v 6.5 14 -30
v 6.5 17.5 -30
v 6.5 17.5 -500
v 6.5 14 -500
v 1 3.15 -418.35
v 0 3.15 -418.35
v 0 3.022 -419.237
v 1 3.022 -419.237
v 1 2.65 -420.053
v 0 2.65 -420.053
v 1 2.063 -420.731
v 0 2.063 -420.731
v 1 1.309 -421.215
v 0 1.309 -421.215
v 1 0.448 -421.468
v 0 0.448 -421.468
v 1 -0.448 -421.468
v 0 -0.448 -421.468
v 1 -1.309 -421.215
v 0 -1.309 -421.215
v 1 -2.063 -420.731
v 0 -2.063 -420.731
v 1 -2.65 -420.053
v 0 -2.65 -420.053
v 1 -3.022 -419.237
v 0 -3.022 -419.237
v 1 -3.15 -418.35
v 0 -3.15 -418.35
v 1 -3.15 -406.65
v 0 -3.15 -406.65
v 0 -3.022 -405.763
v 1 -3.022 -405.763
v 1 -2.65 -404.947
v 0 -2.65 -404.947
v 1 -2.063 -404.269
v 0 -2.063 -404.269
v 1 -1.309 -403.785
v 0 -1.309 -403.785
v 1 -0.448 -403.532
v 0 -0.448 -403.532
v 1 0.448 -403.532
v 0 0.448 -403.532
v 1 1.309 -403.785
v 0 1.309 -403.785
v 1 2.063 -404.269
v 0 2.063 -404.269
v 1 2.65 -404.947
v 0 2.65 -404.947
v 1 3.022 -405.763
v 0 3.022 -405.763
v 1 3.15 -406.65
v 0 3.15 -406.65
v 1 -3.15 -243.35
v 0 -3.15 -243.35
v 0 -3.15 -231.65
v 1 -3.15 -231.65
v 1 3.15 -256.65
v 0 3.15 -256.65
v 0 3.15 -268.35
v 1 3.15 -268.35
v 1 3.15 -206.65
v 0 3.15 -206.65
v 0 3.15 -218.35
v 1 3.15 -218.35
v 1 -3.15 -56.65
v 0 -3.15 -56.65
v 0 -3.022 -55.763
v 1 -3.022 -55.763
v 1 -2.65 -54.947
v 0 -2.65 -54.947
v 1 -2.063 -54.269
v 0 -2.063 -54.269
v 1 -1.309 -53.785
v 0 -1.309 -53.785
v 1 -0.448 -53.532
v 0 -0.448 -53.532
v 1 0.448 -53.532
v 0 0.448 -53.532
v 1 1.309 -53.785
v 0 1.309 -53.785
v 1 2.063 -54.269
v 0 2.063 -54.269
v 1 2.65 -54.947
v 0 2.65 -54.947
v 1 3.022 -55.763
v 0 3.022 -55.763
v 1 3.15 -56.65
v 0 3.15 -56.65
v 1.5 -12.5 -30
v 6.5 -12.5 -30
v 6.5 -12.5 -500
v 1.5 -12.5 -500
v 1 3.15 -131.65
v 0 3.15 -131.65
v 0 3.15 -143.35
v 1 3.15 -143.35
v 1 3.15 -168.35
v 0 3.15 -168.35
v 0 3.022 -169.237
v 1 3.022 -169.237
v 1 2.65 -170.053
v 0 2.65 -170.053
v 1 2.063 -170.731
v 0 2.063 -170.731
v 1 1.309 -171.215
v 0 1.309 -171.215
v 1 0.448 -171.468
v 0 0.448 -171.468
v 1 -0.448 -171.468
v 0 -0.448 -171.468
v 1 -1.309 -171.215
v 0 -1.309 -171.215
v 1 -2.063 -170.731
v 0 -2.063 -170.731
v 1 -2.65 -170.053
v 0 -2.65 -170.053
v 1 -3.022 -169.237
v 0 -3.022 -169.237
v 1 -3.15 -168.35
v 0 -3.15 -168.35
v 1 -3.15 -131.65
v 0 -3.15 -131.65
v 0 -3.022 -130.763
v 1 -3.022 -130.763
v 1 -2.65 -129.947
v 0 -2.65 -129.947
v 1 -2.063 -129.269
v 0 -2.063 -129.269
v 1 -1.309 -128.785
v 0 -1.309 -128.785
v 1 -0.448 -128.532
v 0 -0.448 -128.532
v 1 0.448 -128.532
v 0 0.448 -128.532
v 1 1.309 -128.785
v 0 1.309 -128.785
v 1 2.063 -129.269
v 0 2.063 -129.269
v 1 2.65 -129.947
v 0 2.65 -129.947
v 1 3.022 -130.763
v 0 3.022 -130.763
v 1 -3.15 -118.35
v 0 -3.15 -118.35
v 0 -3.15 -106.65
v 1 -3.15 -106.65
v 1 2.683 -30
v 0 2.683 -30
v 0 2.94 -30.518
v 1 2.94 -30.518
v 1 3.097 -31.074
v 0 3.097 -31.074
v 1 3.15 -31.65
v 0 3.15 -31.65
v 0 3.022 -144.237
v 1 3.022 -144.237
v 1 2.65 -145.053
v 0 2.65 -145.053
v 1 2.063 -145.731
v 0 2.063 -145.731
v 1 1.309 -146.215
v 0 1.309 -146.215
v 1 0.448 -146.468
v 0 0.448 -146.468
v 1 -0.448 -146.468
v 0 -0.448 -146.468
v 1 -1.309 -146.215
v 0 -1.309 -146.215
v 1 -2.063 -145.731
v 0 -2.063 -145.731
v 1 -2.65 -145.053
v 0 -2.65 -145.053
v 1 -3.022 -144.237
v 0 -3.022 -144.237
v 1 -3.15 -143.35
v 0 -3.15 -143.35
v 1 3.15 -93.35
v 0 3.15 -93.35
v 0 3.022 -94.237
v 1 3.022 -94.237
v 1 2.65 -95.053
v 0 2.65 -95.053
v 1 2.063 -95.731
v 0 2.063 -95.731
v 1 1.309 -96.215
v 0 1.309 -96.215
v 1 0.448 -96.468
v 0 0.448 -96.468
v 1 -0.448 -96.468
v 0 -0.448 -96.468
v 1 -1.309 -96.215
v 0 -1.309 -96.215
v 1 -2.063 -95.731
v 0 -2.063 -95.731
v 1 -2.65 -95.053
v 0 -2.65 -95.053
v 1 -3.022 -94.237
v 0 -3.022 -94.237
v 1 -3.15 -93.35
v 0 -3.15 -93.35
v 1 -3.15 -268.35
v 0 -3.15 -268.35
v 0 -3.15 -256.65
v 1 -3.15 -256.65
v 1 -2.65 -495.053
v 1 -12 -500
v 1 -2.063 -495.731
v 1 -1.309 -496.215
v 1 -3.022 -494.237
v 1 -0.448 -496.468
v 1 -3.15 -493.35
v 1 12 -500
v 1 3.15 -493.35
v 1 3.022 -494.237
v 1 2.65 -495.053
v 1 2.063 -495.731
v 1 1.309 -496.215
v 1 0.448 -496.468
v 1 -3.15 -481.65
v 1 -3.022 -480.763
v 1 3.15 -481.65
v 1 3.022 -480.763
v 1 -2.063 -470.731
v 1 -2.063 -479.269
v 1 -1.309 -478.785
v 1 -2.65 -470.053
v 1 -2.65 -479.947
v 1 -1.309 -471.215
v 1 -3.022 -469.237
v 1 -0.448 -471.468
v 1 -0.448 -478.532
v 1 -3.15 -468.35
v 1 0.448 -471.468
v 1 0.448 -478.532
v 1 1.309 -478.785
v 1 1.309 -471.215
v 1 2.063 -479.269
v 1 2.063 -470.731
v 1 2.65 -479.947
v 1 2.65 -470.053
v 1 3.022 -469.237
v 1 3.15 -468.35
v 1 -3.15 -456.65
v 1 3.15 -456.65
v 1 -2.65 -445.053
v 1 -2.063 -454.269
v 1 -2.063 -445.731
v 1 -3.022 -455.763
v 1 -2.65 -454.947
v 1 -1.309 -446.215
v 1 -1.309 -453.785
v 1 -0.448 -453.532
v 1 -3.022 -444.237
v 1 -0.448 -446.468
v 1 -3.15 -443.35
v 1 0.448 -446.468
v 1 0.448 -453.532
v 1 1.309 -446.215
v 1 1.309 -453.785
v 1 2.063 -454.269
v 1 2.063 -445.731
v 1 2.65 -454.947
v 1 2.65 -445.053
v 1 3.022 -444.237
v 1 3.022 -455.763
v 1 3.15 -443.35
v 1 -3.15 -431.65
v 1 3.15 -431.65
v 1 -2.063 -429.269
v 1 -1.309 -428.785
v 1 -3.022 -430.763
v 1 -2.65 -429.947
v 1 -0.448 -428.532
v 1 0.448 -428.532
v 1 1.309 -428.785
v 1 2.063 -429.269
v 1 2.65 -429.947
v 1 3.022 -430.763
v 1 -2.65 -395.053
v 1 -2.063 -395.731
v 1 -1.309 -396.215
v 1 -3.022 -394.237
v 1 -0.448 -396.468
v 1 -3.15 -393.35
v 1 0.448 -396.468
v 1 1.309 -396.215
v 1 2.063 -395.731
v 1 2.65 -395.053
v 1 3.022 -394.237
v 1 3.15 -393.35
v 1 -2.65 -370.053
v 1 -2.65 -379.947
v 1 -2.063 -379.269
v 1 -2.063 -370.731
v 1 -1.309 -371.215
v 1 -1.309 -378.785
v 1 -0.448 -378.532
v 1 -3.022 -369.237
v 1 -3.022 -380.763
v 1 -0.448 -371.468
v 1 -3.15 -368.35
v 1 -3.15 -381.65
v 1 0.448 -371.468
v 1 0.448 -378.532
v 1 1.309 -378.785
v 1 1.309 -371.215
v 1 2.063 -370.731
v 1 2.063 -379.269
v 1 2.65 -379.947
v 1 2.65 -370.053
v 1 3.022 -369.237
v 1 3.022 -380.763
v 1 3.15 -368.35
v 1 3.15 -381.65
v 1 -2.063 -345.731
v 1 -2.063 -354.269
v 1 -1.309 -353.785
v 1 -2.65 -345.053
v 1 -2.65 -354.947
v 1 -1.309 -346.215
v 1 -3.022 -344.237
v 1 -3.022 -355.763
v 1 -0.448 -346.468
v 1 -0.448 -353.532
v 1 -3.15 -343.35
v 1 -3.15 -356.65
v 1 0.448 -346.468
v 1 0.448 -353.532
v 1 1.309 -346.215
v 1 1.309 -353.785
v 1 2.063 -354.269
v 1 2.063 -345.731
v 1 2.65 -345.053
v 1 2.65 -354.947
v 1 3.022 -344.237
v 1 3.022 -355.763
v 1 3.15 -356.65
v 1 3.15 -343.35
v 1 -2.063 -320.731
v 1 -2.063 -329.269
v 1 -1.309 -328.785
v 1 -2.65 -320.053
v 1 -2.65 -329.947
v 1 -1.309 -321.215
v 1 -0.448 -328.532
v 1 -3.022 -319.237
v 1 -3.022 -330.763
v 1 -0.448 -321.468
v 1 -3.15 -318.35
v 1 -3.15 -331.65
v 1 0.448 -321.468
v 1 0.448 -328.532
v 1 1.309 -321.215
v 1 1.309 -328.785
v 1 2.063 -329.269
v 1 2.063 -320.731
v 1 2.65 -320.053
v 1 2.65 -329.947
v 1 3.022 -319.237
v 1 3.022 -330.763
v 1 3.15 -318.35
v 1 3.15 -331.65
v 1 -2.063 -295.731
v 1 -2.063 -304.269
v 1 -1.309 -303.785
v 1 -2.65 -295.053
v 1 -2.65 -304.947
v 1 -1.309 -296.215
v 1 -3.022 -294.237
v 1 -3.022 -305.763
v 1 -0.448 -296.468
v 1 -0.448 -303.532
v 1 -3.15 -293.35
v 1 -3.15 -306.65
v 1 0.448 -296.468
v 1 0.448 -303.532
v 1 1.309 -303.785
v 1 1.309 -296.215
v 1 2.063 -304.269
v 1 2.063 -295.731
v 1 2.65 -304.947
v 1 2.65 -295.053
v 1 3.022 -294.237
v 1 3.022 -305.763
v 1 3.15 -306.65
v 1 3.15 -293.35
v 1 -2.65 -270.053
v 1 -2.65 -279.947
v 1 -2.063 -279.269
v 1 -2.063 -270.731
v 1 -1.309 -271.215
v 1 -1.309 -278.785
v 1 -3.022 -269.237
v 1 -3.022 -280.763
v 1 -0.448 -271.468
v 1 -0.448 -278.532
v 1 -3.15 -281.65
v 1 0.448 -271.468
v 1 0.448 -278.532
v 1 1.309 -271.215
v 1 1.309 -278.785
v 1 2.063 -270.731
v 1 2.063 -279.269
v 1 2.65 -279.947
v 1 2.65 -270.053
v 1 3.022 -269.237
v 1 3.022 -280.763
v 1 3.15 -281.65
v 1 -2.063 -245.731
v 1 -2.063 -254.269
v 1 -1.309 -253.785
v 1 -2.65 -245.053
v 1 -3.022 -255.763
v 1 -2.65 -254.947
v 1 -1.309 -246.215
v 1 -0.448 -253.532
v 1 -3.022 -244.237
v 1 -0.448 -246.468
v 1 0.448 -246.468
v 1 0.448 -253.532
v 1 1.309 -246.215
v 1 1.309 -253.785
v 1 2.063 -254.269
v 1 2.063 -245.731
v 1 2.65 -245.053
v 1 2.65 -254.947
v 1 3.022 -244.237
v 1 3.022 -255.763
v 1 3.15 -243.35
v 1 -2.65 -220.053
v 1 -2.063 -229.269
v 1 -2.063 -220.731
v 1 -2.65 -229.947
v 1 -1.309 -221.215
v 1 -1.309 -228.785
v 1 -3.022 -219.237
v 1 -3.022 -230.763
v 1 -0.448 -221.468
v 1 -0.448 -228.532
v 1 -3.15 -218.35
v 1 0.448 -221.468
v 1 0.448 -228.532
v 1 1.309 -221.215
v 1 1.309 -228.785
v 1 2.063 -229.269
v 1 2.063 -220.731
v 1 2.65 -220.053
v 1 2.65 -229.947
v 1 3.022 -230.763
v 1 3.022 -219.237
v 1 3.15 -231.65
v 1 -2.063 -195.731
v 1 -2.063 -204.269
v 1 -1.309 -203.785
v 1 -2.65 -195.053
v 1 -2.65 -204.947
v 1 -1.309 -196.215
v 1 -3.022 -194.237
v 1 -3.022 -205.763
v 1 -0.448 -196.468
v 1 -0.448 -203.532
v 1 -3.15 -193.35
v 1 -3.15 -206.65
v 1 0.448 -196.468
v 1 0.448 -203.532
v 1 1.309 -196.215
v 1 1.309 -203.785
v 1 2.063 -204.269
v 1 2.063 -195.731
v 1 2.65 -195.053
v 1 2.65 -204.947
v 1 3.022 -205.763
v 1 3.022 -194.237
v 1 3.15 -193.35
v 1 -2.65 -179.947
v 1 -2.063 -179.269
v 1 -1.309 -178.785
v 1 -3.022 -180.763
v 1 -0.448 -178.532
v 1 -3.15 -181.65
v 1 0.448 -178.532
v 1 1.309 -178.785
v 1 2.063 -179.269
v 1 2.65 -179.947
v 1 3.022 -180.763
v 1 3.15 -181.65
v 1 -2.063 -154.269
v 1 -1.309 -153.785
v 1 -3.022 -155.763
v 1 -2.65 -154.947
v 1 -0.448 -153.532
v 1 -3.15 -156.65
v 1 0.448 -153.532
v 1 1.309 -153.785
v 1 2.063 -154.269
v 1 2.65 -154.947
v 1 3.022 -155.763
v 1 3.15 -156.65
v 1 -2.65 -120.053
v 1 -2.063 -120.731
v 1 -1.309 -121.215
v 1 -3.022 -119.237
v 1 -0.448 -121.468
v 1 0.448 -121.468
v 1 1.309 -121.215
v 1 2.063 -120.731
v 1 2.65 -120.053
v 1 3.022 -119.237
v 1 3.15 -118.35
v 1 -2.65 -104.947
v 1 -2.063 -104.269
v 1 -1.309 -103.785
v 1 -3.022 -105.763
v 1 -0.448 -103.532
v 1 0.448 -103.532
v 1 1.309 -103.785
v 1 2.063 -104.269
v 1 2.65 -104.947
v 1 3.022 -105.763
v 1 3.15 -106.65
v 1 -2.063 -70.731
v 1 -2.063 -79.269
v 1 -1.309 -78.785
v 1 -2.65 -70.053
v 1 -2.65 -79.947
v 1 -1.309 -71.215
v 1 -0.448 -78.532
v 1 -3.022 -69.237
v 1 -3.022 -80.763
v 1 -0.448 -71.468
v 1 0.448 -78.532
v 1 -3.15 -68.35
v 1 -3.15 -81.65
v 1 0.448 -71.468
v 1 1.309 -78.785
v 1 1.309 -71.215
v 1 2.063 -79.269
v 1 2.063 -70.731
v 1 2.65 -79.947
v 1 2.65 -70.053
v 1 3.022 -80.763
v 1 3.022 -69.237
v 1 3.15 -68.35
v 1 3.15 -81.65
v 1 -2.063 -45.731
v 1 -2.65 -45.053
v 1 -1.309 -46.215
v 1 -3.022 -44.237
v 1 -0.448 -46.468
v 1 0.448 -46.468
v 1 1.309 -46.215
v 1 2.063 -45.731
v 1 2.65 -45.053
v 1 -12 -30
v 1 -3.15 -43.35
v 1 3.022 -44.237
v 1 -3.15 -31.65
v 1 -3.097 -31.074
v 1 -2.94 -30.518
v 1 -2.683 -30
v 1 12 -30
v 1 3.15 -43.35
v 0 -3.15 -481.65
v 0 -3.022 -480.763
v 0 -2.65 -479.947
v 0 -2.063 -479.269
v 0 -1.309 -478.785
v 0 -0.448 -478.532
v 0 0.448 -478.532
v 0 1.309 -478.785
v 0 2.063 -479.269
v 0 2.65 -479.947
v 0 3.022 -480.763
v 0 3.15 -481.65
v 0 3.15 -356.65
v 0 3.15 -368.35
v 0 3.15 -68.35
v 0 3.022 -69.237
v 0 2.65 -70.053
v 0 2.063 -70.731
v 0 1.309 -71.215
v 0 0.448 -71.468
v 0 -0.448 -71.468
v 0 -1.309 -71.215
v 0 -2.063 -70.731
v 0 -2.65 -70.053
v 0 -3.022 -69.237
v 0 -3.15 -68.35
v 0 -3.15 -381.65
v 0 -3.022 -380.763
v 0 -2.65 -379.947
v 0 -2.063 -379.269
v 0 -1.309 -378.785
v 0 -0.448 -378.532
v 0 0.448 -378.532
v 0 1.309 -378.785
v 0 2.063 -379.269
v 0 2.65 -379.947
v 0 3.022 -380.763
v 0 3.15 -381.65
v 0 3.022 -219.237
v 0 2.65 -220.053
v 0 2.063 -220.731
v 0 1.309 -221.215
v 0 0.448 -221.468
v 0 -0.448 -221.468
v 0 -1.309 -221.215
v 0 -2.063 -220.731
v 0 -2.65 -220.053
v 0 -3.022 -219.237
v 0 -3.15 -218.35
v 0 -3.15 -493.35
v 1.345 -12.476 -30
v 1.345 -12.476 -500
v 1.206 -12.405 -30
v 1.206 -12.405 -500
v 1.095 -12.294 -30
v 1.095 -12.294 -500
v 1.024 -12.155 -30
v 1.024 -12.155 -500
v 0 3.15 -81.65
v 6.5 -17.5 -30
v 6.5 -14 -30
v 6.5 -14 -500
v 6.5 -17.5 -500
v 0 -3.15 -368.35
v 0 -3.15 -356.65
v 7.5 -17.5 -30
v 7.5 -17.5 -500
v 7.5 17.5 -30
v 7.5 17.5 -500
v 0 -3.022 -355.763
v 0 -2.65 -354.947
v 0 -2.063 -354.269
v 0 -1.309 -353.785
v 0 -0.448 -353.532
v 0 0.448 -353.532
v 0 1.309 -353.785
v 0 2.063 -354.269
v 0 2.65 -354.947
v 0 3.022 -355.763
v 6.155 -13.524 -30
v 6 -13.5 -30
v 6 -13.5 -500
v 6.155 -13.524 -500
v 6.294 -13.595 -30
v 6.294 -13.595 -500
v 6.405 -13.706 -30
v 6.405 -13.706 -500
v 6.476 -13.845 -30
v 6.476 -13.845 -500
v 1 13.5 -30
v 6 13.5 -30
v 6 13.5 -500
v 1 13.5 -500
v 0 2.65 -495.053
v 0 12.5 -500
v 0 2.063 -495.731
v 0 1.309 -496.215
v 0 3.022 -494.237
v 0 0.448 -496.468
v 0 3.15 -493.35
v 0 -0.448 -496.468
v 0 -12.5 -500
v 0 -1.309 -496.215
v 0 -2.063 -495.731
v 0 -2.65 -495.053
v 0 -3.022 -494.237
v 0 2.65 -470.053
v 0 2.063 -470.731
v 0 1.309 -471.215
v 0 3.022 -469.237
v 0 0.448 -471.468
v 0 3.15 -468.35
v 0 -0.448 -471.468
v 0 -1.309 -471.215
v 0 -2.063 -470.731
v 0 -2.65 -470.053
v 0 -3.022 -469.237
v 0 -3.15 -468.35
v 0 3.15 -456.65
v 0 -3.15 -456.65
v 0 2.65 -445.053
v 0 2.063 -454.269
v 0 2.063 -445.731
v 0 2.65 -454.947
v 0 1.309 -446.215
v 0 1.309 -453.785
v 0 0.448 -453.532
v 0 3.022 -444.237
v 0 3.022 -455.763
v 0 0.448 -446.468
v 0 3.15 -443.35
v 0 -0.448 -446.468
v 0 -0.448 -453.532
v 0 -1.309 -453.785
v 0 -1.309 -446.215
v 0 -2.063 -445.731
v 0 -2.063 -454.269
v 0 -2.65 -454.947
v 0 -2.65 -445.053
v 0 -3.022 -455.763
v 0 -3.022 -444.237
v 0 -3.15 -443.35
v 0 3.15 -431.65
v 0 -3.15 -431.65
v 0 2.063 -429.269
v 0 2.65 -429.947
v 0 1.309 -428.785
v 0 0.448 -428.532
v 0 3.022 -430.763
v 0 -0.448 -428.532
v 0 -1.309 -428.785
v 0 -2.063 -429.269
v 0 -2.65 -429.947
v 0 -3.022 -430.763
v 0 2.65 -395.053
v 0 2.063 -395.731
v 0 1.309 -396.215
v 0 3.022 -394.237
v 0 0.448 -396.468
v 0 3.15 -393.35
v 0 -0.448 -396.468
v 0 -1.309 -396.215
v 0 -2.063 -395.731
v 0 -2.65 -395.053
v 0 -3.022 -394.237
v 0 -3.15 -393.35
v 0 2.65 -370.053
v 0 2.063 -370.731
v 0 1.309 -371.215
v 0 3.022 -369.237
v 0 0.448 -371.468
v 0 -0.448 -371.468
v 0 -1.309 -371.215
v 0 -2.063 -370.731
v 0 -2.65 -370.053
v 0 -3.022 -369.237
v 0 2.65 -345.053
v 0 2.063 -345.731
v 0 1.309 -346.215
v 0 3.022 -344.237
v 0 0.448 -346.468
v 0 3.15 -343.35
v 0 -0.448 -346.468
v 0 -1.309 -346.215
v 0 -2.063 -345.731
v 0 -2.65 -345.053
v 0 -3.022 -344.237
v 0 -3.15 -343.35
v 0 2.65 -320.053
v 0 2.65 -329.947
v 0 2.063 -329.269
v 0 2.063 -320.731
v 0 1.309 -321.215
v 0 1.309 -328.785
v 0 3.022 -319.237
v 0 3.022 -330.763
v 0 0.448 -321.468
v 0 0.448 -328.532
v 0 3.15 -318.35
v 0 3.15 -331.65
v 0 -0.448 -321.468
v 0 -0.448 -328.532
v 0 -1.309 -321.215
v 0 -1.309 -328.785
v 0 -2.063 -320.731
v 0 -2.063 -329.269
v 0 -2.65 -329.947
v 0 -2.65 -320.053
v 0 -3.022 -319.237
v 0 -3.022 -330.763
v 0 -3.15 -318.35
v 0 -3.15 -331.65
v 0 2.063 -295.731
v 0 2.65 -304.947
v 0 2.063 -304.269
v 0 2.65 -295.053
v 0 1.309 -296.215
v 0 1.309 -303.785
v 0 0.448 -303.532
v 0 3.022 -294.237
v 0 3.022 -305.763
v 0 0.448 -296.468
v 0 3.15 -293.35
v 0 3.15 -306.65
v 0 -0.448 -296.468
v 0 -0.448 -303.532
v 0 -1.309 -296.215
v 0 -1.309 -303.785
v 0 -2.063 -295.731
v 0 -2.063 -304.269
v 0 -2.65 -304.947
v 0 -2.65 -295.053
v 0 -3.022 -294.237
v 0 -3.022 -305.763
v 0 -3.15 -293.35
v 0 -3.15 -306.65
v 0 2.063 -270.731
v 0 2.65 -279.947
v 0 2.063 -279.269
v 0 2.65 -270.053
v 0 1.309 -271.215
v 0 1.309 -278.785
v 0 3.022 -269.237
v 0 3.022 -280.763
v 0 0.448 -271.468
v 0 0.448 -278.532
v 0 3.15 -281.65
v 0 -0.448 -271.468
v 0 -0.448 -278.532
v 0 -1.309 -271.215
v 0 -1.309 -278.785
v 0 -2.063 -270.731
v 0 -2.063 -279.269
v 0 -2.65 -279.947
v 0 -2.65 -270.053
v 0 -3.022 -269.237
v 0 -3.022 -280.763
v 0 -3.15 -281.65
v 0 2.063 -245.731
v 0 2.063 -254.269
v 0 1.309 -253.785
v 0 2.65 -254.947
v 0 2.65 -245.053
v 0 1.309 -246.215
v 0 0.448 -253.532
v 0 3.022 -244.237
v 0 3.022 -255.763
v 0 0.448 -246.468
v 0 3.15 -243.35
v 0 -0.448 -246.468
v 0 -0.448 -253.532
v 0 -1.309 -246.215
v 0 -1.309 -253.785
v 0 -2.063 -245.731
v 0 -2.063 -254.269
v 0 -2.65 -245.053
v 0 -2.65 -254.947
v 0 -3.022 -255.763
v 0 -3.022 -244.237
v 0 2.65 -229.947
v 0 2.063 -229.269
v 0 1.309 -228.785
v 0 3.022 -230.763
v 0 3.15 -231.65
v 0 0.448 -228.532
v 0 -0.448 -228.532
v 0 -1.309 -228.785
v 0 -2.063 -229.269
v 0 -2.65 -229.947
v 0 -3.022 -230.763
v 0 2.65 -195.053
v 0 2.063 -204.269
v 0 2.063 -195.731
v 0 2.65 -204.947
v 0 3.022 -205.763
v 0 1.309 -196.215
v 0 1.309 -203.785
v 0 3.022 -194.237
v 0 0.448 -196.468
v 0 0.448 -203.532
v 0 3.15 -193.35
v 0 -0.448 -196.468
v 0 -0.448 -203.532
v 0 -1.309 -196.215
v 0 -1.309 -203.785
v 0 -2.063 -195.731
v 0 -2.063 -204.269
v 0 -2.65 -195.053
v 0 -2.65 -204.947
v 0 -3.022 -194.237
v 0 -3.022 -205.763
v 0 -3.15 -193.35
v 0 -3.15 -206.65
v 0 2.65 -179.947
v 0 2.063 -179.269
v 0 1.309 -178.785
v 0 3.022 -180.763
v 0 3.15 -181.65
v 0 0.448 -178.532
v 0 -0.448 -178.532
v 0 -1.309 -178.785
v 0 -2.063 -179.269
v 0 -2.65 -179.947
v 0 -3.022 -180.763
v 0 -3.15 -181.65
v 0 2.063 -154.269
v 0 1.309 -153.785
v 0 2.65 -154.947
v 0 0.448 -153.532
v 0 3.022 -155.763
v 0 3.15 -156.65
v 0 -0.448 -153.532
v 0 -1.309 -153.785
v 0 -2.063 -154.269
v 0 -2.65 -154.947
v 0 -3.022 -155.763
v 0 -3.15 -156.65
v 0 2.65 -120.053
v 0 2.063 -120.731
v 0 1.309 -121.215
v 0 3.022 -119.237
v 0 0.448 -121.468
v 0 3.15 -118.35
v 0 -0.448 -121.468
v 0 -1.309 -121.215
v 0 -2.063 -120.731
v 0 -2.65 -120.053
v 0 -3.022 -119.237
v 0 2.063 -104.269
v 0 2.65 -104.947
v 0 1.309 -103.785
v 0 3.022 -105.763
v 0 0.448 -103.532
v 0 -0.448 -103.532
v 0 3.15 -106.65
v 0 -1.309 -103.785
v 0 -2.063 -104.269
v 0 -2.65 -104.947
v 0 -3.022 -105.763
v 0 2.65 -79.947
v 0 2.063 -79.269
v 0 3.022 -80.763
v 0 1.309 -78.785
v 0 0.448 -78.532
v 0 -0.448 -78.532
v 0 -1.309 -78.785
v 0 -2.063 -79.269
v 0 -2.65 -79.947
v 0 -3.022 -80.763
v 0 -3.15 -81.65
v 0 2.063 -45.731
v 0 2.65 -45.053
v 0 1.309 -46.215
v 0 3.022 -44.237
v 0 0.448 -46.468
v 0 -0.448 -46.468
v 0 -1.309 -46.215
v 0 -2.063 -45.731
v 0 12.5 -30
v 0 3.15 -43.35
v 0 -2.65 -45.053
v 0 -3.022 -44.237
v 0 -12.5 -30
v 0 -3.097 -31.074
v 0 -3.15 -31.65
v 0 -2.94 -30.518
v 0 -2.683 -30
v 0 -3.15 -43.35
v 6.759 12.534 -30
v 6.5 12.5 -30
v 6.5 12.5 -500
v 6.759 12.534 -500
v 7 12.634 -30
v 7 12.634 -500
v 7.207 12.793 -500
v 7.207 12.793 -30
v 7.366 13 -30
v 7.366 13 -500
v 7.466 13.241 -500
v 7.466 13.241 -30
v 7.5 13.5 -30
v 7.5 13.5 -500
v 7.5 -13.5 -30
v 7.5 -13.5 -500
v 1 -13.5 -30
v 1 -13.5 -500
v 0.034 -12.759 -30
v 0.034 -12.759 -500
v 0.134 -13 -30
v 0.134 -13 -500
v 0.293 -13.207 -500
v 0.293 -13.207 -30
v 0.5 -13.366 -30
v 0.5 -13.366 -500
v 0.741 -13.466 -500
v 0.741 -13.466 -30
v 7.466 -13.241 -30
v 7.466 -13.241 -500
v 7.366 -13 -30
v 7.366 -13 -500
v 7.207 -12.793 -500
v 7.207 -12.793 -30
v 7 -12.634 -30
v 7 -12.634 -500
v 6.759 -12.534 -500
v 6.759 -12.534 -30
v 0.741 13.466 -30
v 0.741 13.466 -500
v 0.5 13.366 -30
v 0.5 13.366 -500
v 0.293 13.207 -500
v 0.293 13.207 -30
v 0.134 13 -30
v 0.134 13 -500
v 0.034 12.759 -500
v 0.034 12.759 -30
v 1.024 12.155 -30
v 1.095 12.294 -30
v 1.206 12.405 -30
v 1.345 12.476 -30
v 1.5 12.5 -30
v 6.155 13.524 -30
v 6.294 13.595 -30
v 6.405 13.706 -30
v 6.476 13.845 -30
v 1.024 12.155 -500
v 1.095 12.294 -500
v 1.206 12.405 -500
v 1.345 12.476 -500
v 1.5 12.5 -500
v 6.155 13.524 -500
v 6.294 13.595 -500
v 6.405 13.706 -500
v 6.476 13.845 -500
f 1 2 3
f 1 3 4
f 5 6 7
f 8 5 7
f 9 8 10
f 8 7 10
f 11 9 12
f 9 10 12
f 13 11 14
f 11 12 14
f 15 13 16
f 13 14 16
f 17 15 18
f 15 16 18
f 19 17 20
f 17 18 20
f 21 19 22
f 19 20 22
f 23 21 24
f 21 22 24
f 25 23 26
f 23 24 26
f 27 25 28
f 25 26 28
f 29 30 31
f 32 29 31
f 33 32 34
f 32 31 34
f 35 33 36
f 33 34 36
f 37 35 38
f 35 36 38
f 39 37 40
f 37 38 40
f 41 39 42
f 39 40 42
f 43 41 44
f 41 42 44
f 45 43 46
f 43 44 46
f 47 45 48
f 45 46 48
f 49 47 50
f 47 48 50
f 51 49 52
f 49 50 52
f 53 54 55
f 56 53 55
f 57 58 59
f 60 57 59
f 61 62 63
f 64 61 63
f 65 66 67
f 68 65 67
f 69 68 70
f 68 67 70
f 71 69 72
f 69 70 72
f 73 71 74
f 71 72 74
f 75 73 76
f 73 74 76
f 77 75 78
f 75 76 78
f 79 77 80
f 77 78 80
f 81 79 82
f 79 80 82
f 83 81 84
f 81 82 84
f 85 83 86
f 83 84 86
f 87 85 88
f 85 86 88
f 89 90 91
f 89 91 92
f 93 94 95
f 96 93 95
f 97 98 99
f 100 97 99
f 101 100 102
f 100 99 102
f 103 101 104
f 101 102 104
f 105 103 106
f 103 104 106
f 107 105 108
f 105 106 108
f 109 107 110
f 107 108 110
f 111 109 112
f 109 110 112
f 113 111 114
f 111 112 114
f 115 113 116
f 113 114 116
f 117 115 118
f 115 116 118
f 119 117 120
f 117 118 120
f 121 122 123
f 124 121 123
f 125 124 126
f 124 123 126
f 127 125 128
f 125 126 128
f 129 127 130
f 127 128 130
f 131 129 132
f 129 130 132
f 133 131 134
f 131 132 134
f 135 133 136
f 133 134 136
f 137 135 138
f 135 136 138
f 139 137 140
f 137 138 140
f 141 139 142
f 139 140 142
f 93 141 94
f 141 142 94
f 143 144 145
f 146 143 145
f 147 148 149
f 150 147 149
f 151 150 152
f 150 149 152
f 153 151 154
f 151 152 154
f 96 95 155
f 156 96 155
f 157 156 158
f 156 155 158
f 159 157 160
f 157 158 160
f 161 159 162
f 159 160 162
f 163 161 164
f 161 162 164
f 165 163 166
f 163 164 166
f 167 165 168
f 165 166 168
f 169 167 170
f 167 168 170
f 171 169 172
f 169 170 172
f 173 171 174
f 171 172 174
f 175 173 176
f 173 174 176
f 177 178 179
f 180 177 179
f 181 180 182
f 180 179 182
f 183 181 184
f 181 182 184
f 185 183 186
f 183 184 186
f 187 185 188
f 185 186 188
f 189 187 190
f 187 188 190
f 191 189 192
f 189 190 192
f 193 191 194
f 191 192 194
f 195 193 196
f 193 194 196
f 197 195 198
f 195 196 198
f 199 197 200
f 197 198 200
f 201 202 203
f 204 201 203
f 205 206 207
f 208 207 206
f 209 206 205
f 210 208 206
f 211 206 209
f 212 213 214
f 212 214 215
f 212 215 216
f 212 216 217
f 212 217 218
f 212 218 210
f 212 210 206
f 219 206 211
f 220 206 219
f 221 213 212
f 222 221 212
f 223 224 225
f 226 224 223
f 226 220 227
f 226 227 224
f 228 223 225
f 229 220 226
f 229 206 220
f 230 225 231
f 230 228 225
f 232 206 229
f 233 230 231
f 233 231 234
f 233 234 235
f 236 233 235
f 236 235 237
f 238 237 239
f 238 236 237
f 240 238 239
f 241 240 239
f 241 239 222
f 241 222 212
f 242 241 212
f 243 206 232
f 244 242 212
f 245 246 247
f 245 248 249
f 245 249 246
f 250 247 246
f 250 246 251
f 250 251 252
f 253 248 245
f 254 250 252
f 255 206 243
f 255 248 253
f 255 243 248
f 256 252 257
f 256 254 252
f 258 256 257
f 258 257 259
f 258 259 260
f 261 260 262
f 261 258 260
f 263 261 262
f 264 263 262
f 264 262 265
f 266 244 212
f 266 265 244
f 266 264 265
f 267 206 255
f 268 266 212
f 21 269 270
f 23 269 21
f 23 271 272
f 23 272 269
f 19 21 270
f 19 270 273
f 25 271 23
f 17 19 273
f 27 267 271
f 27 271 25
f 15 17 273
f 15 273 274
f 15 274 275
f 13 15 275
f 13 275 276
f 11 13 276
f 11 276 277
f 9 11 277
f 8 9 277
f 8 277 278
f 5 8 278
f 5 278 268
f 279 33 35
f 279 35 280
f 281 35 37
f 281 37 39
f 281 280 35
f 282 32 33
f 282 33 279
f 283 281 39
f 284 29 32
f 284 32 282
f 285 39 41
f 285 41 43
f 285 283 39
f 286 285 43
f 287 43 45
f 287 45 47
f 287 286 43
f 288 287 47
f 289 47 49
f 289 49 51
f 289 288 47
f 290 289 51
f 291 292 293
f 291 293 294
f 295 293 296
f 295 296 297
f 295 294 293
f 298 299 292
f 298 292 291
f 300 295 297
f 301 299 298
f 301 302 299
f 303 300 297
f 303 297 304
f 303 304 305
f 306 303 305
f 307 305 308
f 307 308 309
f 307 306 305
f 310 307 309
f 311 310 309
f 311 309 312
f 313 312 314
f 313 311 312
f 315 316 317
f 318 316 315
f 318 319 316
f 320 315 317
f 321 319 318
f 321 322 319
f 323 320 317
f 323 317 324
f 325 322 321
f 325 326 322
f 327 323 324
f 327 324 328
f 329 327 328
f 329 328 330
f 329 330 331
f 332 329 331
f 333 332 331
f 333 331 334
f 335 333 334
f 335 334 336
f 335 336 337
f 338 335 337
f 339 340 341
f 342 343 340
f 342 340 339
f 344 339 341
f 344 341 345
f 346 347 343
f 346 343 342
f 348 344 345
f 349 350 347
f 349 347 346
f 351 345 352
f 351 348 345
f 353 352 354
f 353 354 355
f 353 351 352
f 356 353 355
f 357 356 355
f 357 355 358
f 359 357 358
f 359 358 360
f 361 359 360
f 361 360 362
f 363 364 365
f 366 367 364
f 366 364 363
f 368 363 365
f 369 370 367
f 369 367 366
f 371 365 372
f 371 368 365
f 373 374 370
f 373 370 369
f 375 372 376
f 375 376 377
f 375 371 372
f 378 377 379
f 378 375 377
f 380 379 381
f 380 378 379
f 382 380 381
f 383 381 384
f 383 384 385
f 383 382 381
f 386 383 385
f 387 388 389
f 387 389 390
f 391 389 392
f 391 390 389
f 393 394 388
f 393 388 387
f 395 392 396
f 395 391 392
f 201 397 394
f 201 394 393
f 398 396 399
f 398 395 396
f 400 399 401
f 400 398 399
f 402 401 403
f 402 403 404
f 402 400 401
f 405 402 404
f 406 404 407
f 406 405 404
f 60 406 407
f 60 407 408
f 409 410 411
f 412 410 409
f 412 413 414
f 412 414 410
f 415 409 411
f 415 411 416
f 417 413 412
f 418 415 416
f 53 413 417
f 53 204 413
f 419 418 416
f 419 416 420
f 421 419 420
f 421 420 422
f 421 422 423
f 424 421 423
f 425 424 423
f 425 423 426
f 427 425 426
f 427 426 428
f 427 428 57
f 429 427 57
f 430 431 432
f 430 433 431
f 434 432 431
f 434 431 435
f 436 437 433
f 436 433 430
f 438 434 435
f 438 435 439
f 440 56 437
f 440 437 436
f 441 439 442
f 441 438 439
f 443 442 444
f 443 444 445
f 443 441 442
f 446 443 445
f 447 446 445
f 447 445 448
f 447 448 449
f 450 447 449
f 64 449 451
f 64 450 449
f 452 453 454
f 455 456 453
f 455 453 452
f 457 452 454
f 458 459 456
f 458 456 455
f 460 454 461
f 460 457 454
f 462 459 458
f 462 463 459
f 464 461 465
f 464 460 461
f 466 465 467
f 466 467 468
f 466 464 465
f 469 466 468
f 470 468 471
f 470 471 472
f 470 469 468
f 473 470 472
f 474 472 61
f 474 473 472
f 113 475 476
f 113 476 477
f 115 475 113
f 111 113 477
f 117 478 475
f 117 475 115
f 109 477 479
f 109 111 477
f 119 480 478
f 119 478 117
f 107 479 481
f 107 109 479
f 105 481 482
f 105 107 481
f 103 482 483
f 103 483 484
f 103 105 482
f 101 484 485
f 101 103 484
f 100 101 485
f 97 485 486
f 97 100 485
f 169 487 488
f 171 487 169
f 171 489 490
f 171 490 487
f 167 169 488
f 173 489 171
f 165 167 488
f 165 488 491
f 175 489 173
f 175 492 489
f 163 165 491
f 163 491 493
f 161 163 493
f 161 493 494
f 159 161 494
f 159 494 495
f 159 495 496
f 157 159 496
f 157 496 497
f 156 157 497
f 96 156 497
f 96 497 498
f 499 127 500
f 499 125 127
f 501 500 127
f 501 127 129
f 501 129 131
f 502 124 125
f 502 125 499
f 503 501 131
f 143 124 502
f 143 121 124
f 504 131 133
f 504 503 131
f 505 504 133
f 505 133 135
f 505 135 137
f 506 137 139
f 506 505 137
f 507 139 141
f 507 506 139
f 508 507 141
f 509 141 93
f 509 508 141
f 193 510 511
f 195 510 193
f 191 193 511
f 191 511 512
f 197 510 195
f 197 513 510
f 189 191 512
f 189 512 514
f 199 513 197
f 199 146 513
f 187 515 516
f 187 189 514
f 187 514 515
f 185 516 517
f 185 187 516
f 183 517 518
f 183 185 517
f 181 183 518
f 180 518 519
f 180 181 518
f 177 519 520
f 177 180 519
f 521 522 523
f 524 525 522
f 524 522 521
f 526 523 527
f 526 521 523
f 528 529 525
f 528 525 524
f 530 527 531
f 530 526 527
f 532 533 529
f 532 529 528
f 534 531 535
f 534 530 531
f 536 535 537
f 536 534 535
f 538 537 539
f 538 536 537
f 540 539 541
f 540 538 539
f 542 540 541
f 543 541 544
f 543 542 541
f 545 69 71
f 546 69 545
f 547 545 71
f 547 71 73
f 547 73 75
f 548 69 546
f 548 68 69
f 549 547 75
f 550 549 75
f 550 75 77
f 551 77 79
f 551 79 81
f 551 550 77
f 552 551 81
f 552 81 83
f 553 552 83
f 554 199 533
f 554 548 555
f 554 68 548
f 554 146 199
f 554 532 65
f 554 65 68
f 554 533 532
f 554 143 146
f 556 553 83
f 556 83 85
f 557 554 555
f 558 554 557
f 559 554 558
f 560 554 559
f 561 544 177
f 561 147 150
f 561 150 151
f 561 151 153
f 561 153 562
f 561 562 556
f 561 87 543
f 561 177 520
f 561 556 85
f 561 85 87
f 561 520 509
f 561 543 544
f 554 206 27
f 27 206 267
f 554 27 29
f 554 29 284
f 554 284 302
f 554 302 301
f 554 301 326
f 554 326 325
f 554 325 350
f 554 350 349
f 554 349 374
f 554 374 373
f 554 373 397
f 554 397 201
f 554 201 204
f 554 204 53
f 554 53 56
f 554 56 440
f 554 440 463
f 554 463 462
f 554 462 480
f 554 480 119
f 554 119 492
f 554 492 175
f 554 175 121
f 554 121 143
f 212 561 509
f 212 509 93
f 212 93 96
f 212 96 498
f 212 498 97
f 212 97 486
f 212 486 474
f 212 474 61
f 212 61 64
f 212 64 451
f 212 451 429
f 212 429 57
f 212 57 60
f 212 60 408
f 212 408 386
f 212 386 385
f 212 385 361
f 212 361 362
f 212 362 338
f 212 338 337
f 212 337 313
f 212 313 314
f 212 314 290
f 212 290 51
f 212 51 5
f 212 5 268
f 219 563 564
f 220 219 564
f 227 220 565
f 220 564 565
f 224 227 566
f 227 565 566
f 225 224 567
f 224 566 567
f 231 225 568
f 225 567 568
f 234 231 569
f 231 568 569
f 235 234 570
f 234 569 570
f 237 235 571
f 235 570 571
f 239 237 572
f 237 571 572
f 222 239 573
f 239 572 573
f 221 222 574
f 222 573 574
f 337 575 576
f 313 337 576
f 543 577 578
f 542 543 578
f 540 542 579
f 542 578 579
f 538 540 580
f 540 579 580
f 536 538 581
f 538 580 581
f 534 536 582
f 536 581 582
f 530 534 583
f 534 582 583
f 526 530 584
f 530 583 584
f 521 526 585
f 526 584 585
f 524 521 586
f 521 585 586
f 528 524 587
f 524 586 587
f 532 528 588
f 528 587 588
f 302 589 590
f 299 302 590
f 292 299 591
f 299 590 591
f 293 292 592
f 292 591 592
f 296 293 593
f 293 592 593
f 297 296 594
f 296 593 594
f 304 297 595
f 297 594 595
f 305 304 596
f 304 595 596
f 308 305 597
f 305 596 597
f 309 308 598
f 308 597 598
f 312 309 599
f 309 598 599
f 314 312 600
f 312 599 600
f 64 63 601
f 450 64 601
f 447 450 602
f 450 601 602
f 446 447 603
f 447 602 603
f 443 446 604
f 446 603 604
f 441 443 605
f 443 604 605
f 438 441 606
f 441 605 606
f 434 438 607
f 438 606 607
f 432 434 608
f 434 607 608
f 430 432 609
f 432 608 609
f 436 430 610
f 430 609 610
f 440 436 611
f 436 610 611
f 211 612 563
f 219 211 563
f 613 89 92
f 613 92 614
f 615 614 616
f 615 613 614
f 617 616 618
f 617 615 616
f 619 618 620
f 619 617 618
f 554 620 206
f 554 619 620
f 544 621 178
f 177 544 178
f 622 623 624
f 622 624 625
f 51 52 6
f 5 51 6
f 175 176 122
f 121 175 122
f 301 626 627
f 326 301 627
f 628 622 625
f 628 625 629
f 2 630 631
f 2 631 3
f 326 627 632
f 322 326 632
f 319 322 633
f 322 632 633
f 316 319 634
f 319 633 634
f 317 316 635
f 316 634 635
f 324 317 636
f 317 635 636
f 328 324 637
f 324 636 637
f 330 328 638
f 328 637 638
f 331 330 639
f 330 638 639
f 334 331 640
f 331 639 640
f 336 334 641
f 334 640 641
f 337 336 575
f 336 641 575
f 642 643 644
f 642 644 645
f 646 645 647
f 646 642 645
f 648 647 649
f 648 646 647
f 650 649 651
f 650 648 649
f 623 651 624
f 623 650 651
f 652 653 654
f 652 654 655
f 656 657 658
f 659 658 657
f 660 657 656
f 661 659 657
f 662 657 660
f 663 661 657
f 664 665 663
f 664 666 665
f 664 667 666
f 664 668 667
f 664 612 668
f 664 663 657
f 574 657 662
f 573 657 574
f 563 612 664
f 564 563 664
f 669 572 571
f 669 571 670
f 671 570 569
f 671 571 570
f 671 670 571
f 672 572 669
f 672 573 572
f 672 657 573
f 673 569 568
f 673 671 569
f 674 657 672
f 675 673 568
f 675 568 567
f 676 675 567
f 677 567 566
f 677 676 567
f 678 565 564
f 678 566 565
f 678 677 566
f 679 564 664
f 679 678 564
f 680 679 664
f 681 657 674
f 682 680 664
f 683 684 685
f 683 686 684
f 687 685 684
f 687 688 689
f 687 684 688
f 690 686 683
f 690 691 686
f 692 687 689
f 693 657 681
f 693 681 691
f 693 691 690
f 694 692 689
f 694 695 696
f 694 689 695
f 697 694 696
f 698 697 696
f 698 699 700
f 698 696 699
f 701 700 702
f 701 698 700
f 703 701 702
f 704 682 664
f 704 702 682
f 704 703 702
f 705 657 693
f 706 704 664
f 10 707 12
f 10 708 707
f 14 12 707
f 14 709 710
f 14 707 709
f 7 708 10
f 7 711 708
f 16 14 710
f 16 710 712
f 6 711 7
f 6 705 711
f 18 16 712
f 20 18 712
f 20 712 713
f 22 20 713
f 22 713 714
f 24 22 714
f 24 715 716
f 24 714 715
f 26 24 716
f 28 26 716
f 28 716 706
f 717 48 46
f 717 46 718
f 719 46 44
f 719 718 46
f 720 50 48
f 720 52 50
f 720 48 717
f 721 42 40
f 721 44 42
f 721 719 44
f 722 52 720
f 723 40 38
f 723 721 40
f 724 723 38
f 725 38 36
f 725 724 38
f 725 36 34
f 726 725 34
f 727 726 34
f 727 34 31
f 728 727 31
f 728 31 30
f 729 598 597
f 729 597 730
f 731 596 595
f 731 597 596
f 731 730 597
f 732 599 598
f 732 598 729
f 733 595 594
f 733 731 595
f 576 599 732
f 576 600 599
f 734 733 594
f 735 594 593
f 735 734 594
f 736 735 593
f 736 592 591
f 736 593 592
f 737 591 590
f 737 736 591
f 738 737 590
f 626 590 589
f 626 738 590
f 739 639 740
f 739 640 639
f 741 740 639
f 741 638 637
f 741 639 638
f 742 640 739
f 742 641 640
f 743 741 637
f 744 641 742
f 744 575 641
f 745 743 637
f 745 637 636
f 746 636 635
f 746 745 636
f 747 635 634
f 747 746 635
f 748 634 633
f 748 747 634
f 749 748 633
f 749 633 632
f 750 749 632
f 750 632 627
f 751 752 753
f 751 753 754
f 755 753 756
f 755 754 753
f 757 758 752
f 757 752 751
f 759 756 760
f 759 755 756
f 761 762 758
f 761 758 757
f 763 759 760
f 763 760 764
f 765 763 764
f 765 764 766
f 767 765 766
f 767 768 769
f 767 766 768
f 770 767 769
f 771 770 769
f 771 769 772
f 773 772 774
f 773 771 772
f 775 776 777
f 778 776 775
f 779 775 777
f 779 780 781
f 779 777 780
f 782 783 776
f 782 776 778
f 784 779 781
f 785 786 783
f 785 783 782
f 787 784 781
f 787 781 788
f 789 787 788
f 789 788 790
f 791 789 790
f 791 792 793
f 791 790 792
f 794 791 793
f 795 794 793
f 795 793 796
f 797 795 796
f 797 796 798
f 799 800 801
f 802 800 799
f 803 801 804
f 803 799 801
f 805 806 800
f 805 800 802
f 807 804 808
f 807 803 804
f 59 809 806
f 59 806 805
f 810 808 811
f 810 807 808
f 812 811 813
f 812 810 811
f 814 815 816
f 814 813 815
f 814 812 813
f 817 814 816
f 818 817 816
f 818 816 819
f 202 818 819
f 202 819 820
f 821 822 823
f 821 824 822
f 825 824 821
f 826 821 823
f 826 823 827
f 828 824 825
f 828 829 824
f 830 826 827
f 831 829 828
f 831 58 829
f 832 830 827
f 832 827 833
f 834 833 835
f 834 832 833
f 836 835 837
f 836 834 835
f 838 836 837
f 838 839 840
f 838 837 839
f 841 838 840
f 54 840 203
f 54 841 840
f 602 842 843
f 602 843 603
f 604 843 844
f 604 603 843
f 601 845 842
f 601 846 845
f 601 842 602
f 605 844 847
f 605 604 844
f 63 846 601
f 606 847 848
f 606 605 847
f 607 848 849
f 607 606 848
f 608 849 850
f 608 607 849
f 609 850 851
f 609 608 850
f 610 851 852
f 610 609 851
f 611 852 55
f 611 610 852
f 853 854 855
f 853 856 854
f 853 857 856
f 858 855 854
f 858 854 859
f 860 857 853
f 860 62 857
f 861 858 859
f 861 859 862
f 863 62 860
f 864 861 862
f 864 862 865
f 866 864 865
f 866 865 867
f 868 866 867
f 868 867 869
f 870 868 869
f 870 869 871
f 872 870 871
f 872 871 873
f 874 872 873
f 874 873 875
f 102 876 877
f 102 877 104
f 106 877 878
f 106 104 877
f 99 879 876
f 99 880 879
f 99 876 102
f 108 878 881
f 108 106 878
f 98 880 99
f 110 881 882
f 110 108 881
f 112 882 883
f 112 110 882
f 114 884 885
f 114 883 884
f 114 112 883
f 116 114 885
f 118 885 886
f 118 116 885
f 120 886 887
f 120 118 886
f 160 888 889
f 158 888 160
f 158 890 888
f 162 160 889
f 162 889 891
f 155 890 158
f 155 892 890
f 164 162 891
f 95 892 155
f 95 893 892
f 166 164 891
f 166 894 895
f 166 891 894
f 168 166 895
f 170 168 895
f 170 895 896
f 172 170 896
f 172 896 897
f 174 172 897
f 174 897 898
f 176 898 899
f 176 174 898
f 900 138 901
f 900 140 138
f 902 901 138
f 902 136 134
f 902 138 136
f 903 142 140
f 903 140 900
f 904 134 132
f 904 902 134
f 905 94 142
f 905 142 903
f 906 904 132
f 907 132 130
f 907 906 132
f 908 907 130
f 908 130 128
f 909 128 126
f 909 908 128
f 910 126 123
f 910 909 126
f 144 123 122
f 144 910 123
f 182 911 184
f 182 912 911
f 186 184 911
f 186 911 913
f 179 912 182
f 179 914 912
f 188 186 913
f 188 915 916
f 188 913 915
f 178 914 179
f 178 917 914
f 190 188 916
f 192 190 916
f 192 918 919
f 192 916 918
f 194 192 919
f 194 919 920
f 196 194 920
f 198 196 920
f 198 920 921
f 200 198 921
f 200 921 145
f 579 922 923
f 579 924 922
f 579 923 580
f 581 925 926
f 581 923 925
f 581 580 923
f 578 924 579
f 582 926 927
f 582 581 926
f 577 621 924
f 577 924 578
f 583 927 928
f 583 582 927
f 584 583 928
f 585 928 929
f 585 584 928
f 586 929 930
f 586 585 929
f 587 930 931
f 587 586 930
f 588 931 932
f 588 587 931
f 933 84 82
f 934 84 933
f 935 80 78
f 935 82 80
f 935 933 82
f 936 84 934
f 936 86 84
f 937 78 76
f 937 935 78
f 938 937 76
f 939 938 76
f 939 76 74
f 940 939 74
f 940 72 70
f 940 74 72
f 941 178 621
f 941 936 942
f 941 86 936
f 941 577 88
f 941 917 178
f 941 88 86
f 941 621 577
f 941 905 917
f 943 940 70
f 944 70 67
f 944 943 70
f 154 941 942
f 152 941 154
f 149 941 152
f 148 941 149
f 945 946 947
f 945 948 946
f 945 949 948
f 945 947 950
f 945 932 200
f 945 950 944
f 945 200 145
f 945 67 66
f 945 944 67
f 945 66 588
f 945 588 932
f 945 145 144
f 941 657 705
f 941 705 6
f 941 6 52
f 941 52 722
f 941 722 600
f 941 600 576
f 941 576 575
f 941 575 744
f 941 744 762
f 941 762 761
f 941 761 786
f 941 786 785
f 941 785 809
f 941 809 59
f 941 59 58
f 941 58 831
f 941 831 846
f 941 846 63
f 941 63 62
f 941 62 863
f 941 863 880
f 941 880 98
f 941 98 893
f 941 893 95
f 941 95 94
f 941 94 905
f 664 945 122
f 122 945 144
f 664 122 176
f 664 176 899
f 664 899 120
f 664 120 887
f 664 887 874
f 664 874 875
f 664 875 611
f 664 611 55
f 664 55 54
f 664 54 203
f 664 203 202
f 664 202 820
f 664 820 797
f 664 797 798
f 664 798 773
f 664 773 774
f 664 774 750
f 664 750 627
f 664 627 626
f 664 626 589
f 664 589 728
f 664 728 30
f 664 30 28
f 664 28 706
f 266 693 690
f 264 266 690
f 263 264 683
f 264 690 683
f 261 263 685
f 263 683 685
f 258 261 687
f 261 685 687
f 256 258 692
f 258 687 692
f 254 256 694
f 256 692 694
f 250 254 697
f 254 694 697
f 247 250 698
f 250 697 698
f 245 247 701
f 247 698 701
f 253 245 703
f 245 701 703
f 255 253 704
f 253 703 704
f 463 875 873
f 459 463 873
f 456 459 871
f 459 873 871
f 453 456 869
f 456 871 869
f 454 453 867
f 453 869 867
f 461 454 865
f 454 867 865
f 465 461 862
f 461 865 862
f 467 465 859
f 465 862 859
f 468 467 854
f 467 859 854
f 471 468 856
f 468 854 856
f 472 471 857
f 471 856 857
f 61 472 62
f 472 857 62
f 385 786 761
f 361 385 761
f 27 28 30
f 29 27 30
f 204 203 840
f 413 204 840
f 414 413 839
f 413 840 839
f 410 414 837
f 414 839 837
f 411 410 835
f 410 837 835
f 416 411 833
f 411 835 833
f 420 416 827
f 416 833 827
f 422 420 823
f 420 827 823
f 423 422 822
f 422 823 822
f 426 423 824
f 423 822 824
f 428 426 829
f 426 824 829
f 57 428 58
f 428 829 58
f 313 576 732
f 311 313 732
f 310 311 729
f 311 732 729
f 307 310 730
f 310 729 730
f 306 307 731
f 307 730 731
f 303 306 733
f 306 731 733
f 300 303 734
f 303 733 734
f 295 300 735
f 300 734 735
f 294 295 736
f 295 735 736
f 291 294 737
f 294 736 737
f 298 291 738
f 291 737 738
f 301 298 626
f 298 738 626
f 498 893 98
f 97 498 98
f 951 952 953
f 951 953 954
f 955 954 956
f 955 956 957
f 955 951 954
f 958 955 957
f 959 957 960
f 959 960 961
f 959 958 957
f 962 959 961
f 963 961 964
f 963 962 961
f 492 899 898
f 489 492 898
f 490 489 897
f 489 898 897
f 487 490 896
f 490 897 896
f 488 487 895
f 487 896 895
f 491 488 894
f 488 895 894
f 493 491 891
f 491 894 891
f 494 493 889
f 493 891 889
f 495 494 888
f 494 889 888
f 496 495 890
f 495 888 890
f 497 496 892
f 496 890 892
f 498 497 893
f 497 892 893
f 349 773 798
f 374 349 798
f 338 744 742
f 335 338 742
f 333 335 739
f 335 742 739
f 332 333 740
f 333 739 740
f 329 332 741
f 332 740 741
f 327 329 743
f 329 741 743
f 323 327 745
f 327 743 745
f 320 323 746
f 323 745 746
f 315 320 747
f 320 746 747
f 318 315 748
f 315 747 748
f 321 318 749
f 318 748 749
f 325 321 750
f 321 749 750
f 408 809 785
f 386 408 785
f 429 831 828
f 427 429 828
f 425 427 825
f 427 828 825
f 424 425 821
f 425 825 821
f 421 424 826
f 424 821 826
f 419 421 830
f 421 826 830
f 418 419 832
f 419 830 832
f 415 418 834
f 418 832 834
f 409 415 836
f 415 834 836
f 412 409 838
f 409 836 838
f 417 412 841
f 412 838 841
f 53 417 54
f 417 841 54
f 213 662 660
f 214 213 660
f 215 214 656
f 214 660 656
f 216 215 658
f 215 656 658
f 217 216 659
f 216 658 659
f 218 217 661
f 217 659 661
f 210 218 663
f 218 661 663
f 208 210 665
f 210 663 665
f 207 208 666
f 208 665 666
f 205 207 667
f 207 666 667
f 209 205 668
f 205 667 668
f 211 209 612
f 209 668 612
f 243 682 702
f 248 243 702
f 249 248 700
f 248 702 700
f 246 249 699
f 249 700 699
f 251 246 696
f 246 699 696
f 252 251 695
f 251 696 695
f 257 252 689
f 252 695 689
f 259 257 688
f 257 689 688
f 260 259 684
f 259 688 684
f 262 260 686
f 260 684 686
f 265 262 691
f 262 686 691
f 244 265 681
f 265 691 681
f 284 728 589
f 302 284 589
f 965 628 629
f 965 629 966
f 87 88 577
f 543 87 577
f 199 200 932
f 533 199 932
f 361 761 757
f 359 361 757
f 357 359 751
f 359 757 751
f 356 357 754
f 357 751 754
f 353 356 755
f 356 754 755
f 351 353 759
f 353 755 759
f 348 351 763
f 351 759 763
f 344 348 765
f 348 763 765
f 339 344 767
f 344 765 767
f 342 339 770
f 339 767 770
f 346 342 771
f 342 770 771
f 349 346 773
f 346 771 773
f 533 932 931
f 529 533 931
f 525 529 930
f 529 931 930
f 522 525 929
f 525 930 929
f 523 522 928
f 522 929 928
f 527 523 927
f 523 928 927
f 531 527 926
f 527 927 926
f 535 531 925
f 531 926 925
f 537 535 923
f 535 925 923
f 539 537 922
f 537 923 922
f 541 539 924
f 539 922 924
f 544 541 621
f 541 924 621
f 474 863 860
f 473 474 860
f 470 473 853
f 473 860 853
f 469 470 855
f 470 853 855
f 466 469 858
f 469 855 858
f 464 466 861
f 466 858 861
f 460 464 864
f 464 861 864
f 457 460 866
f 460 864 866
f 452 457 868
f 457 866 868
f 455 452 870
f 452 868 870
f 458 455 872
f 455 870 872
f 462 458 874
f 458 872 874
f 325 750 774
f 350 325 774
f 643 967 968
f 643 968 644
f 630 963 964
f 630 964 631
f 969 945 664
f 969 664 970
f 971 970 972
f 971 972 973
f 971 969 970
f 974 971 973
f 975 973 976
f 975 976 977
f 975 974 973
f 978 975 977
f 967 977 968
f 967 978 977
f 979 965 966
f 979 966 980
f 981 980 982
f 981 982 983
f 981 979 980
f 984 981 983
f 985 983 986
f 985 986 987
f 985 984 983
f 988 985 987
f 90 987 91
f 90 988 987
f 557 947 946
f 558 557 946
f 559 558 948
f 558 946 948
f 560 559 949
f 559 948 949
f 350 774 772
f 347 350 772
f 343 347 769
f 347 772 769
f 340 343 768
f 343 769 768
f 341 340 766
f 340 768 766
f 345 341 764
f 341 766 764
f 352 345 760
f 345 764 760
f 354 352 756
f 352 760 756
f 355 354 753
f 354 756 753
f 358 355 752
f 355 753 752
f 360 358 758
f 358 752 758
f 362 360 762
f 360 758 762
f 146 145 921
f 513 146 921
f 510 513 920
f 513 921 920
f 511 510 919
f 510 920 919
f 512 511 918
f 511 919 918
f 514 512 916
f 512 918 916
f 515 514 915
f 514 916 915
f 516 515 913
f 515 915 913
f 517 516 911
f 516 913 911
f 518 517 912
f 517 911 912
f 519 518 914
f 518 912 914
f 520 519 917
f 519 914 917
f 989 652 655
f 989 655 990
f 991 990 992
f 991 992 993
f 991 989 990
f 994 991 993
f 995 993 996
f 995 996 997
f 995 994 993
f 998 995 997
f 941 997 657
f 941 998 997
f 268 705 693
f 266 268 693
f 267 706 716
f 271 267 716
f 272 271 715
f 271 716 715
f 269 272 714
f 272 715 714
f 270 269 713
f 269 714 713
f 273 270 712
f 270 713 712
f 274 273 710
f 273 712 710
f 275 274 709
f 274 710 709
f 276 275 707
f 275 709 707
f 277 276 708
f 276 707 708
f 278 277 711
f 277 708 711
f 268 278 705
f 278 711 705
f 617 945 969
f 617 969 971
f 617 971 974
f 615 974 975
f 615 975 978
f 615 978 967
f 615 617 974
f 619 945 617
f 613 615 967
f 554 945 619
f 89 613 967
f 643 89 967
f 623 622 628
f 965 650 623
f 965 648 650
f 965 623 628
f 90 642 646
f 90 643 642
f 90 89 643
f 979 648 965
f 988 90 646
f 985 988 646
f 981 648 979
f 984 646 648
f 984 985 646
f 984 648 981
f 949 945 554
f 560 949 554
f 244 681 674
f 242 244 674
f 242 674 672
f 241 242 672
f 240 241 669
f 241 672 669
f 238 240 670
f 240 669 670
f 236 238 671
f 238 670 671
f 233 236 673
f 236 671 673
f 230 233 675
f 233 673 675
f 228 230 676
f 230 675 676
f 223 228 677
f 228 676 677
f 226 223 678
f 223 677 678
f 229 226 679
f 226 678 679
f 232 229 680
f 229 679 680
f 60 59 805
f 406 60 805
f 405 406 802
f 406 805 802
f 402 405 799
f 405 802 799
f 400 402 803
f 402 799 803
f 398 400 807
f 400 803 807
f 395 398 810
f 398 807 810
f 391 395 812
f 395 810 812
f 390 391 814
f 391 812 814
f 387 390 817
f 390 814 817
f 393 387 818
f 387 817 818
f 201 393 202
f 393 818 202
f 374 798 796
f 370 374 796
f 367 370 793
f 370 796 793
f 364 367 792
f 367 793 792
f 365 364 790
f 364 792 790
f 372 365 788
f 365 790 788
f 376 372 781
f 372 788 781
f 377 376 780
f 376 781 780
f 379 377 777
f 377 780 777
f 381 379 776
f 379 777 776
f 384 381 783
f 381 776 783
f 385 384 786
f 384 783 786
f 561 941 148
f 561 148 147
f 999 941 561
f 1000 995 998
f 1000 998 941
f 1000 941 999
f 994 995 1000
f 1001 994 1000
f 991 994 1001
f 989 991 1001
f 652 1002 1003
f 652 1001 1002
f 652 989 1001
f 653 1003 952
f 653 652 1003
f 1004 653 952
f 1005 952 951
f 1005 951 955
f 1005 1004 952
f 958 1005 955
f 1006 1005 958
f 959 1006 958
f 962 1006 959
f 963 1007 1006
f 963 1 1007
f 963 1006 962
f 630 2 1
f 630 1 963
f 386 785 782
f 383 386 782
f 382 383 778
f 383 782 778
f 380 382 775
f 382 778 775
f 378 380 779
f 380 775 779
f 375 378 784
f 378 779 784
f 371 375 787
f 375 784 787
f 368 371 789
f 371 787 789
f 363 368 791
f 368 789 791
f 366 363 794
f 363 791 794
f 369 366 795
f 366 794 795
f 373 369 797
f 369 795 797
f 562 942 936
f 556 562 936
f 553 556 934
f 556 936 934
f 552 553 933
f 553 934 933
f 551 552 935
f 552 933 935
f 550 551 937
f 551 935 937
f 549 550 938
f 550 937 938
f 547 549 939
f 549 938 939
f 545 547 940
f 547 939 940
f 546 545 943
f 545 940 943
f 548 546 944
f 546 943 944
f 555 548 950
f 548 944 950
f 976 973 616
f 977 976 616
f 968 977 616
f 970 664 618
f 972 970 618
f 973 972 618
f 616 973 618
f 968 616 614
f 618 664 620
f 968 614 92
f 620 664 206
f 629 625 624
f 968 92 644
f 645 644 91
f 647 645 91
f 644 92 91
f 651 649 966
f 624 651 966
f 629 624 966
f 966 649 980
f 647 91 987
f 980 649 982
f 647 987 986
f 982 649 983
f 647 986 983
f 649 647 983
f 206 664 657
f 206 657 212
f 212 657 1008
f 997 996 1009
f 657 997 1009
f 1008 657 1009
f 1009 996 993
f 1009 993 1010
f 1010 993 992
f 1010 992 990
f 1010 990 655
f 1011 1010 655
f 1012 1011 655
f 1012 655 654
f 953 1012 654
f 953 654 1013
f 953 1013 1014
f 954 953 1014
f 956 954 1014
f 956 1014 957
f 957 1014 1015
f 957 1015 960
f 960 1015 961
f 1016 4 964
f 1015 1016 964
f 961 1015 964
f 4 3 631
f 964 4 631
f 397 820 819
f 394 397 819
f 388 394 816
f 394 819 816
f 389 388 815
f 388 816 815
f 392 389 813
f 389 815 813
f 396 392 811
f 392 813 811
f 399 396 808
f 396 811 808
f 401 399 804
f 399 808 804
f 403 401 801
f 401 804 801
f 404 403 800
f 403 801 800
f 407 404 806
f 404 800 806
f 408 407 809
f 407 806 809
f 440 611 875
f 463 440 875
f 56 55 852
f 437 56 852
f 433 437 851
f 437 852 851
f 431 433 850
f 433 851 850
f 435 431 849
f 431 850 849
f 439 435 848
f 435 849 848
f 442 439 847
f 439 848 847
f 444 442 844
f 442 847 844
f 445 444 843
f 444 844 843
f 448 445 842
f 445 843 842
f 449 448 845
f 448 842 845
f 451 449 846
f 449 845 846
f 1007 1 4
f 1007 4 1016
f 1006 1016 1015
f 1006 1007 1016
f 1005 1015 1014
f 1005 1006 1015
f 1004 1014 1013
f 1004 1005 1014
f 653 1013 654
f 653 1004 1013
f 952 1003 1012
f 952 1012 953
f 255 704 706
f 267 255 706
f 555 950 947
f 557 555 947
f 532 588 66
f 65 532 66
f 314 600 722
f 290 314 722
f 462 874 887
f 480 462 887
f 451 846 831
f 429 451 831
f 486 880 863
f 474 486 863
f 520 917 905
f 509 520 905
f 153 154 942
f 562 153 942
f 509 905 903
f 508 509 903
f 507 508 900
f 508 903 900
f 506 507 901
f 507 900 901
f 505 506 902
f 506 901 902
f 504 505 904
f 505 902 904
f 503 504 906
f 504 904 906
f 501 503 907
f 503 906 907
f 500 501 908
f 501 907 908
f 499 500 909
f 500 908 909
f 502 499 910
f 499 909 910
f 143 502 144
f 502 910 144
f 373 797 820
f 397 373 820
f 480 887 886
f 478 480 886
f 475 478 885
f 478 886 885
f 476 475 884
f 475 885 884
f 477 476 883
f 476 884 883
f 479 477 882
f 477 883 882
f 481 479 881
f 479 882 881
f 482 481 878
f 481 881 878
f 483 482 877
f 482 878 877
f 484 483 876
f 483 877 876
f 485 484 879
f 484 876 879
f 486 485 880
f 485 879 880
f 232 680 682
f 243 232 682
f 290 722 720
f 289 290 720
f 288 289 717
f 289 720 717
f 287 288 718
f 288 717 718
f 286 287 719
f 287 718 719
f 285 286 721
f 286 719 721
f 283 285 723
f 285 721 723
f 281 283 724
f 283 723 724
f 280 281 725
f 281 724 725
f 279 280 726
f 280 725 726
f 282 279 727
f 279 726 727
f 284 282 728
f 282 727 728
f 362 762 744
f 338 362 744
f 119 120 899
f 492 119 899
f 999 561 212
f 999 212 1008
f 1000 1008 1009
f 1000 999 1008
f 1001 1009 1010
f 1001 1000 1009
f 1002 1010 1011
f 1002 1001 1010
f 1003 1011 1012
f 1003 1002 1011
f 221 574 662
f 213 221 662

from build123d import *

# Parameters (mm, degrees)
BOSS_EXTRUDE1_DEPTH = 500
CUT_EXTRUDE1_DEPTH  = 7.5
LPATTERN1_COUNT     = 40
LPATTERN1_PITCH     = 25
SKETCH3_W           = 59.422885842
SKETCH3_H           = 88.158569076
CUT_EXTRUDE2_DEPTH  = 530


with BuildPart() as part:
    # Sketch1 → Boss-Extrude1 (new, symmetric)
    with BuildSketch(Plane.XY):
        with BuildLine():
            Line((7.5, 17.5), (6.5, 17.5))
            Line((6.5, 17.5), (6.5, 14))
            ThreePointArc((6.5, 14), (6.353553391, 13.646446609), (6, 13.5))
            Line((6, 13.5), (1, 13.5))
            ThreePointArc((1, 13.5), (0.292893219, 13.207106781), (0, 12.5))
            Line((0, 12.5), (0, -12.5))
            ThreePointArc((0, -12.5), (0.292893219, -13.207106781), (1, -13.5))
            Line((1, -13.5), (6, -13.5))
            ThreePointArc((6, -13.5), (6.353553391, -13.646446609), (6.5, -14))
            Line((6.5, -14), (6.5, -17.5))
            Line((6.5, -17.5), (7.5, -17.5))
            Line((7.5, -17.5), (7.5, -13.5))
            ThreePointArc((7.5, -13.5), (7.207106781, -12.792893219), (6.5, -12.5))
            Line((6.5, -12.5), (1.5, -12.5))
            ThreePointArc((1.5, -12.5), (1.146446609, -12.353553391), (1, -12))
            Line((1, -12), (1, 12))
            ThreePointArc((1, 12), (1.146446609, 12.353553391), (1.5, 12.5))
            Line((1.5, 12.5), (6.5, 12.5))
            ThreePointArc((6.5, 12.5), (7.207106781, 12.792893219), (7.5, 13.5))
            Line((7.5, 13.5), (7.5, 17.5))
        make_face()
    extrude(amount=BOSS_EXTRUDE1_DEPTH, both=True)

    # Sketch2 → Cut-Extrude1 (cut)
    with BuildSketch(Plane(origin=(0, 0, 0), x_dir=(0, 0, -1), z_dir=(1, 0, 0))):
        with BuildLine():
            Line((-493.35, 3.15), (-481.65, 3.15))
            ThreePointArc((-481.65, 3.15), (-478.5, 0), (-481.65, -3.15))
            Line((-481.65, -3.15), (-493.35, -3.15))
            ThreePointArc((-493.35, -3.15), (-496.5, 0), (-493.35, 3.15))
        make_face()
    cut_extrude1 = extrude(amount=CUT_EXTRUDE1_DEPTH, mode=Mode.SUBTRACT)

    # LPattern1: Cut-Extrude1 ×40
    with Locations(*[(0, 0, -i * LPATTERN1_PITCH) for i in range(1, LPATTERN1_COUNT)]):
        add(cut_extrude1, mode=Mode.SUBTRACT)

    # Sketch3 → Cut-Extrude2 (cut)
    with BuildSketch(Plane.XY.offset(500)):
        Rectangle(SKETCH3_W, SKETCH3_H)
    extrude(amount=-CUT_EXTRUDE2_DEPTH, mode=Mode.SUBTRACT)


solid = part.part
